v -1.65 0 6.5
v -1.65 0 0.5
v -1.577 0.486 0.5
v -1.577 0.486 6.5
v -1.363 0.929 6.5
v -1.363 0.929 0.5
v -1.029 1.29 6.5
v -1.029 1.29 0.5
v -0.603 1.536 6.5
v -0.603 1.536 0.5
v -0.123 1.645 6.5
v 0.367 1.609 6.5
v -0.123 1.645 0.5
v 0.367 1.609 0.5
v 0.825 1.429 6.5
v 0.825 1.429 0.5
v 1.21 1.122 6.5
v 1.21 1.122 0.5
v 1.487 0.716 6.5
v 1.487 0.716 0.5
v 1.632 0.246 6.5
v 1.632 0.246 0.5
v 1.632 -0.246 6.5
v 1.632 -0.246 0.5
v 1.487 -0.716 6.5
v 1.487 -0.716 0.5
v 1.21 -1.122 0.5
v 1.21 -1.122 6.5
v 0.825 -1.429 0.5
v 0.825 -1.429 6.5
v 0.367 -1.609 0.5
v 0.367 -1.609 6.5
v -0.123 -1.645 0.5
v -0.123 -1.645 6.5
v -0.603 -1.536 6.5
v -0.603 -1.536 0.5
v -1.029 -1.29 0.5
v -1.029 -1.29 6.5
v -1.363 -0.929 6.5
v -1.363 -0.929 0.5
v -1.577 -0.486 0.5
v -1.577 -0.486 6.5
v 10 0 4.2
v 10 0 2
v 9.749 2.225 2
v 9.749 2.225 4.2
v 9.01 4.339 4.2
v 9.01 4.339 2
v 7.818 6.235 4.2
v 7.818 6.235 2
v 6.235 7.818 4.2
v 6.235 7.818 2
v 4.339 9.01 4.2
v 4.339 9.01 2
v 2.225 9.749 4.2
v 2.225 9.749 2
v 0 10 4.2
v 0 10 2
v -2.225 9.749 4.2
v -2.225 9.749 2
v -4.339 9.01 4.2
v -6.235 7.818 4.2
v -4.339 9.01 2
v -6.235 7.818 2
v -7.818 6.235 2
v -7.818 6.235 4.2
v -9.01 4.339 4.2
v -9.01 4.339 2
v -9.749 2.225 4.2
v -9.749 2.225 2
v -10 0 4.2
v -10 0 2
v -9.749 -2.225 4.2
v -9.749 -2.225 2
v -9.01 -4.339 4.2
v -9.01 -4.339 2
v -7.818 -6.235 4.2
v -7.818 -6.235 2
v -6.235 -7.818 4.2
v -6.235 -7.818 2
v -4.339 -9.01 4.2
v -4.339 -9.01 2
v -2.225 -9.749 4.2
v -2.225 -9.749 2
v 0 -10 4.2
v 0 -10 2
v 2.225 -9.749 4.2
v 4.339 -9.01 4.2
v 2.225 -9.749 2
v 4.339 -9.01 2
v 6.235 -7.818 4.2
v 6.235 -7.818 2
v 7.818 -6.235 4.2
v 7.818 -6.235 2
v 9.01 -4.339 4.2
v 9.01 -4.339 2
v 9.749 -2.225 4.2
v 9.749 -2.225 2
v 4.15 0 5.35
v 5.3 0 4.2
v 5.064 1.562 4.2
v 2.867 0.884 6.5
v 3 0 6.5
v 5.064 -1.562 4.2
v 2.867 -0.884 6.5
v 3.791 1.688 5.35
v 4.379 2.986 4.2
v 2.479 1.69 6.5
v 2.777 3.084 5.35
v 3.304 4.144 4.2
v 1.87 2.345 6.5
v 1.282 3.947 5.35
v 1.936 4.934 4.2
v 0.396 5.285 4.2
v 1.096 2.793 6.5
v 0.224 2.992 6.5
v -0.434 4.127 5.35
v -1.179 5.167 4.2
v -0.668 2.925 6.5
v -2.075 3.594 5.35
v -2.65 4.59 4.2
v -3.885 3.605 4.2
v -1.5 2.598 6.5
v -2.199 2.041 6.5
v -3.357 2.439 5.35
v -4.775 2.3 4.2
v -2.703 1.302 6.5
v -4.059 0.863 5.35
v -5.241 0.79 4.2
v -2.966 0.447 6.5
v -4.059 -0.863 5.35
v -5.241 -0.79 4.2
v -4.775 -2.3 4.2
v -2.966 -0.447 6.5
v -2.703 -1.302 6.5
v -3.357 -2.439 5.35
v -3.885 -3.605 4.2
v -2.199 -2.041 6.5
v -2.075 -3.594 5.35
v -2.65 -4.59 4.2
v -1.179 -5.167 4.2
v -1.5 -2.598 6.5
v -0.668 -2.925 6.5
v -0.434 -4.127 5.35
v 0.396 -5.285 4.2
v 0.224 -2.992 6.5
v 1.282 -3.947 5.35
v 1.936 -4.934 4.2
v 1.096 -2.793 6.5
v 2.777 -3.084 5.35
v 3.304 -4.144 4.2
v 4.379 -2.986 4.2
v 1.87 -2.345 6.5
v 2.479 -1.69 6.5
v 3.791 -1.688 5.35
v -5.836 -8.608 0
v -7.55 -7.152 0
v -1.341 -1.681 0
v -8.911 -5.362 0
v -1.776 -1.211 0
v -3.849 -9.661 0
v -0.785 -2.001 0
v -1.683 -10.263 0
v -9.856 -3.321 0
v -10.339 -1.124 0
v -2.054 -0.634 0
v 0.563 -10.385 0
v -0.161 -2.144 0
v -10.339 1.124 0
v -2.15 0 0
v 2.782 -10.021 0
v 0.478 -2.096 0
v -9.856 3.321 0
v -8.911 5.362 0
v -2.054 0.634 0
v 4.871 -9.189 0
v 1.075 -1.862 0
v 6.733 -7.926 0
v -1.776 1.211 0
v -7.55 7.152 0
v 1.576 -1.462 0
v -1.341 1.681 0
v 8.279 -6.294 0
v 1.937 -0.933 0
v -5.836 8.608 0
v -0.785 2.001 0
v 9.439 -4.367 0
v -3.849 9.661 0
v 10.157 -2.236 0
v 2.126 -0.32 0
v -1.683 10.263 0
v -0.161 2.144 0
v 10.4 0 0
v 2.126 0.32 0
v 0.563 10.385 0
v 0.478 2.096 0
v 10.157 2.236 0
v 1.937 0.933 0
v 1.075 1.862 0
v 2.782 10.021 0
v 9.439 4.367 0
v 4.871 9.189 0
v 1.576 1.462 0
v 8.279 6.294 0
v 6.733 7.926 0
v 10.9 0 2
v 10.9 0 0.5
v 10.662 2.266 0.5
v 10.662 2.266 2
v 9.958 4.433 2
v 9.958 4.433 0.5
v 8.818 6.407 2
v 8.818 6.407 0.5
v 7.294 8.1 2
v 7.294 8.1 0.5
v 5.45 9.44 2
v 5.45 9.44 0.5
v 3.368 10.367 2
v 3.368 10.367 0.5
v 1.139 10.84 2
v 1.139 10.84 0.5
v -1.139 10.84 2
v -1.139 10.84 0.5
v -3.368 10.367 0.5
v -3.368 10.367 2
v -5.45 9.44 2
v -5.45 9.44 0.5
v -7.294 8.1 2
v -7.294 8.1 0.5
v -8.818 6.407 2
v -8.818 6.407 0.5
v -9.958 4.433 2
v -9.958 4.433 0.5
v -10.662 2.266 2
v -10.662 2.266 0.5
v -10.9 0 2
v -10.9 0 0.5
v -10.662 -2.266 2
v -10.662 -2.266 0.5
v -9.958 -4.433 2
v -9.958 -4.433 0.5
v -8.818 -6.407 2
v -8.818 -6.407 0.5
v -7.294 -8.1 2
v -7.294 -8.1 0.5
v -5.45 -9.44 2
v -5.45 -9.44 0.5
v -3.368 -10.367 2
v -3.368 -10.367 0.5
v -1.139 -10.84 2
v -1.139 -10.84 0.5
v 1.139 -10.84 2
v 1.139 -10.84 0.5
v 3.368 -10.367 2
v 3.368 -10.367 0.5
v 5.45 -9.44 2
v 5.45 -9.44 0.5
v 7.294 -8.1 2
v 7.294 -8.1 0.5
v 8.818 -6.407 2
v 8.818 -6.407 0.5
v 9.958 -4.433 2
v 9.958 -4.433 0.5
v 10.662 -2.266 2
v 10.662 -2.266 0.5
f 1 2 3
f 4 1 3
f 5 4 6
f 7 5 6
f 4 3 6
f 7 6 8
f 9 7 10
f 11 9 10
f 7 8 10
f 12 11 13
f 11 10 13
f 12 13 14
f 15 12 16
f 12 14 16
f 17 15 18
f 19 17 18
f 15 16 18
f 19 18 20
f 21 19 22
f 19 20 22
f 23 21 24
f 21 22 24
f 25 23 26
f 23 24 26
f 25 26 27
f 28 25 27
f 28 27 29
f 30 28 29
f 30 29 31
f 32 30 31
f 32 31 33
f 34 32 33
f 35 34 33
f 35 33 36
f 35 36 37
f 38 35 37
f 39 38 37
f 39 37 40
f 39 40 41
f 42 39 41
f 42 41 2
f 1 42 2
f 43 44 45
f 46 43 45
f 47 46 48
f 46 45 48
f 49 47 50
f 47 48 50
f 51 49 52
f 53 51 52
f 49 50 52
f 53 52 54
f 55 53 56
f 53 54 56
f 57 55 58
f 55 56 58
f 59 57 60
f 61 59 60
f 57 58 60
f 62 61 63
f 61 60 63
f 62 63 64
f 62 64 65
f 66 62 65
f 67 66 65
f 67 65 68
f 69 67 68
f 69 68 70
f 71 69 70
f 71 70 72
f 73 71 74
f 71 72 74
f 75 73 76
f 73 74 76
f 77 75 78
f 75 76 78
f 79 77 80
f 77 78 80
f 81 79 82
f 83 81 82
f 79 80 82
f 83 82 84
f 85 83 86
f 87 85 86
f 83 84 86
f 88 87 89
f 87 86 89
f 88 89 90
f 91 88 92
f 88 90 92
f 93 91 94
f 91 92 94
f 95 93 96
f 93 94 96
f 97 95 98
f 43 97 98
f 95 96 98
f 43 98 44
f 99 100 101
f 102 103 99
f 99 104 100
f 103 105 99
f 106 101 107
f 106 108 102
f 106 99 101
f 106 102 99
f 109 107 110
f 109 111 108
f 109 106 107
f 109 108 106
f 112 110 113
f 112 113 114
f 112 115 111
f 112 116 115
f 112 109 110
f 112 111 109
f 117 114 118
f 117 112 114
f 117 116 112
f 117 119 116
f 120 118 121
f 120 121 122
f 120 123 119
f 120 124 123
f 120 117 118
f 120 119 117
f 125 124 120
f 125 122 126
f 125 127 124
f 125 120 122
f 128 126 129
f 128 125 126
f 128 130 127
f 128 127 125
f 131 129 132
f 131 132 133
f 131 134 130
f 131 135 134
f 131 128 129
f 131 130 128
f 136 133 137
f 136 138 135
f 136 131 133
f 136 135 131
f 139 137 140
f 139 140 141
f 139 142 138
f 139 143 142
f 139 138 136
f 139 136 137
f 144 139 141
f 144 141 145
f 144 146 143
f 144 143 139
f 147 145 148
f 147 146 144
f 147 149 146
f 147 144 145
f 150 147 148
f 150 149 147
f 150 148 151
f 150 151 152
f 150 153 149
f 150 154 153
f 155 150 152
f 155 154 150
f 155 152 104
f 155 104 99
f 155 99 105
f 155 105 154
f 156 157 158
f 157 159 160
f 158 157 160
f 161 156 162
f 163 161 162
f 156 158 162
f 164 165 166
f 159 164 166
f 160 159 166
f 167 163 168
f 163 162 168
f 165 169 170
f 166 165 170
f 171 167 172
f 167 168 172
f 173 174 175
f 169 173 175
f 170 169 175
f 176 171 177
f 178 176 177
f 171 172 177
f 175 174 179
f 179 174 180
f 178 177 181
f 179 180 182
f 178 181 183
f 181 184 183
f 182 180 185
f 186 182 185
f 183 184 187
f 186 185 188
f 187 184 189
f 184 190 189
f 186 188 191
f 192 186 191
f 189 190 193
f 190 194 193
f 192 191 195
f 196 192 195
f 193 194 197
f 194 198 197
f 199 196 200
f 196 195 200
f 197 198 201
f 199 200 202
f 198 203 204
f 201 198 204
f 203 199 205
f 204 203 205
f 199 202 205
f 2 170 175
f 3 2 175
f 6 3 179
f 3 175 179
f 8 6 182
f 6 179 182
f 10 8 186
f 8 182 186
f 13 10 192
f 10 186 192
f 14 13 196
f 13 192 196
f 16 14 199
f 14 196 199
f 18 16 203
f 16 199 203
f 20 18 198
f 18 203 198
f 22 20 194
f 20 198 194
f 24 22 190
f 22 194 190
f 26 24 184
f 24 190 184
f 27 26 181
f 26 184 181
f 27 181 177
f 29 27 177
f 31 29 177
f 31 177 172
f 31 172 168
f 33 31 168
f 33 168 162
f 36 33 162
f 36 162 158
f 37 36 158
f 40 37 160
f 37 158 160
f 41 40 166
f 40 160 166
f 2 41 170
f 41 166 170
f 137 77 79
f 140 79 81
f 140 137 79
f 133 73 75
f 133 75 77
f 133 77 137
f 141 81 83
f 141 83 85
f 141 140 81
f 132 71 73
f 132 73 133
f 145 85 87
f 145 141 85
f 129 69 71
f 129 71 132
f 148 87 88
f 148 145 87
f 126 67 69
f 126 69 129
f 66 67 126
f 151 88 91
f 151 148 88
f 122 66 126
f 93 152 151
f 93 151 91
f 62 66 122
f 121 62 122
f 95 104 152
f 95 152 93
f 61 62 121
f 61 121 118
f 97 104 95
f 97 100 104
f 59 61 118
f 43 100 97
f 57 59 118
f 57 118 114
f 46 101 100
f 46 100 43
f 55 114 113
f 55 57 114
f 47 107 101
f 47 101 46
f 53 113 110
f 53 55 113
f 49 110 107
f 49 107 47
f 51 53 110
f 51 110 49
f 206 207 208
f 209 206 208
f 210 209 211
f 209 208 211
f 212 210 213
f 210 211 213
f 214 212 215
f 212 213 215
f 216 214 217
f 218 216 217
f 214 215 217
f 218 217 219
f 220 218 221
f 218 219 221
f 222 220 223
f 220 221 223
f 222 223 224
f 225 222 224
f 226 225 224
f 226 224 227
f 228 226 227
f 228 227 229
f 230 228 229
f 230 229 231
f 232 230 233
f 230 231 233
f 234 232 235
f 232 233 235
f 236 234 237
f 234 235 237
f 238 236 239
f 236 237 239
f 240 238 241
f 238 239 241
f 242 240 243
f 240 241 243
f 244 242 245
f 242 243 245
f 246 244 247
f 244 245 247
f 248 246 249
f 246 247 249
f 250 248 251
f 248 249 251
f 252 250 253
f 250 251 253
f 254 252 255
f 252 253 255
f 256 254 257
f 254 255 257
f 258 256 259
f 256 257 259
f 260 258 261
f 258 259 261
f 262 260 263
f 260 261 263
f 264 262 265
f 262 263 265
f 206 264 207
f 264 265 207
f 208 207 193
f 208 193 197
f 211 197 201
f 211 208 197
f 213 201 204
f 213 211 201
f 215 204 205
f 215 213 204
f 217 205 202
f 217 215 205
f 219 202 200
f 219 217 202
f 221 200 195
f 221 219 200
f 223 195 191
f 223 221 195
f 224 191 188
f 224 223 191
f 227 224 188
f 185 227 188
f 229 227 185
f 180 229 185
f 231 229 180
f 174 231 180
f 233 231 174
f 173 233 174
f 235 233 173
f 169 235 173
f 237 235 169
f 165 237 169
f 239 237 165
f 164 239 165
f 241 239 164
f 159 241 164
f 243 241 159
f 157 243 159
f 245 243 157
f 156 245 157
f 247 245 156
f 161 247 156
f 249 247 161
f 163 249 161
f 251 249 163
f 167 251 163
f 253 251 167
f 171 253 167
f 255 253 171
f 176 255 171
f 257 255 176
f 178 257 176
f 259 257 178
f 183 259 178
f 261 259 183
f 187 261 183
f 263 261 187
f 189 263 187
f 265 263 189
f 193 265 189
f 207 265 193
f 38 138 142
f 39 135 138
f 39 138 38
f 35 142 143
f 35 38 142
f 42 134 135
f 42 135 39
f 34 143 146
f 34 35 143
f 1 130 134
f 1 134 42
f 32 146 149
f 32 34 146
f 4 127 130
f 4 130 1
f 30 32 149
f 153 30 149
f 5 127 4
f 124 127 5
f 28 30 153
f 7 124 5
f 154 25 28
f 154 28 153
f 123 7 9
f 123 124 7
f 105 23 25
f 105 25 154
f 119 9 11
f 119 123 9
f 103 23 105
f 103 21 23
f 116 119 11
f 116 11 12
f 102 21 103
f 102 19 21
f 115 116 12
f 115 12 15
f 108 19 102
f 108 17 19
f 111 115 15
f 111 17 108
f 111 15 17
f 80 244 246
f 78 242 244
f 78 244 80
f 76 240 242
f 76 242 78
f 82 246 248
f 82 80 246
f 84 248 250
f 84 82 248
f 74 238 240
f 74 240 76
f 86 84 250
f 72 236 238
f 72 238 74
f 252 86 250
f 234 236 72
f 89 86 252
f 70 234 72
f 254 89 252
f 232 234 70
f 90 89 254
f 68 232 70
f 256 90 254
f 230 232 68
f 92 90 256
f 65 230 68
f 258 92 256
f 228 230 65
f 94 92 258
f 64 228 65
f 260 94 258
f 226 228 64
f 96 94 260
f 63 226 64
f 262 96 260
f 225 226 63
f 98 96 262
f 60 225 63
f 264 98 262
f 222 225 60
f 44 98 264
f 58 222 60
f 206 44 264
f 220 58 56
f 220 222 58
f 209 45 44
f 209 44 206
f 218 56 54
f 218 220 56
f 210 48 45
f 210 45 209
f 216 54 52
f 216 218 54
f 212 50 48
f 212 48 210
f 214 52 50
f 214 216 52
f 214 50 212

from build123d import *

# Parameters (mm, degrees)
SKETCH1_R           = 10.9
BOSS_EXTRUDE1_DEPTH = 2
SKETCH2_R           = 10
BOSS_EXTRUDE2_DEPTH = 2.2
SKETCH4_R           = 3
BOSS_EXTRUDE3_DEPTH = 2.3
SKETCH3_R           = 1.65
CUT_EXTRUDE1_DEPTH  = 17.729315587
CHAMFER1_SIZE       = 2.3
CHAMFER2_SIZE       = 0.5
CHAMFER3_SIZE       = 0.5


with BuildPart() as part:
    # Sketch1 → Boss-Extrude1 (new body)
    with BuildSketch(Plane.XY):
        Circle(SKETCH1_R)
    extrude(amount=BOSS_EXTRUDE1_DEPTH)

    # Sketch2 → Boss-Extrude2 (add)
    with BuildSketch(Plane.XY.offset(2)):
        Circle(SKETCH2_R)
    extrude(amount=BOSS_EXTRUDE2_DEPTH)

    # Sketch4 → Boss-Extrude3 (add)
    with BuildSketch(Plane.XY.offset(4.2)):
        Circle(SKETCH4_R)
    extrude(amount=BOSS_EXTRUDE3_DEPTH)

    # Sketch3 → Cut-Extrude1 (cut, through all)
    with BuildSketch(Plane(origin=(0, 0, 0), x_dir=(-1, 0, 0), z_dir=(0, 0, -1))):
        Circle(SKETCH3_R)
    extrude(amount=-CUT_EXTRUDE1_DEPTH, mode=Mode.SUBTRACT)

    # Chamfer1
    chamfer1_edges = [part.edges().sort_by_distance(p)[0] for p in [
        (-3, 0, 4.2),
    ]]
    chamfer(chamfer1_edges, length=CHAMFER1_SIZE - 0.0001)  # a hair under: the kernel refuses the full size

    # Chamfer2
    chamfer2_edges = [part.edges().sort_by_distance(p)[0] for p in [
        (1.65, 0, 0),
    ]]
    chamfer(chamfer2_edges, length=CHAMFER2_SIZE)

    # Chamfer3
    chamfer3_edges = [part.edges().sort_by_distance(p)[0] for p in [
        (-10.9, 0, 0),
    ]]
    chamfer(chamfer3_edges, length=CHAMFER3_SIZE)


solid = part.part
